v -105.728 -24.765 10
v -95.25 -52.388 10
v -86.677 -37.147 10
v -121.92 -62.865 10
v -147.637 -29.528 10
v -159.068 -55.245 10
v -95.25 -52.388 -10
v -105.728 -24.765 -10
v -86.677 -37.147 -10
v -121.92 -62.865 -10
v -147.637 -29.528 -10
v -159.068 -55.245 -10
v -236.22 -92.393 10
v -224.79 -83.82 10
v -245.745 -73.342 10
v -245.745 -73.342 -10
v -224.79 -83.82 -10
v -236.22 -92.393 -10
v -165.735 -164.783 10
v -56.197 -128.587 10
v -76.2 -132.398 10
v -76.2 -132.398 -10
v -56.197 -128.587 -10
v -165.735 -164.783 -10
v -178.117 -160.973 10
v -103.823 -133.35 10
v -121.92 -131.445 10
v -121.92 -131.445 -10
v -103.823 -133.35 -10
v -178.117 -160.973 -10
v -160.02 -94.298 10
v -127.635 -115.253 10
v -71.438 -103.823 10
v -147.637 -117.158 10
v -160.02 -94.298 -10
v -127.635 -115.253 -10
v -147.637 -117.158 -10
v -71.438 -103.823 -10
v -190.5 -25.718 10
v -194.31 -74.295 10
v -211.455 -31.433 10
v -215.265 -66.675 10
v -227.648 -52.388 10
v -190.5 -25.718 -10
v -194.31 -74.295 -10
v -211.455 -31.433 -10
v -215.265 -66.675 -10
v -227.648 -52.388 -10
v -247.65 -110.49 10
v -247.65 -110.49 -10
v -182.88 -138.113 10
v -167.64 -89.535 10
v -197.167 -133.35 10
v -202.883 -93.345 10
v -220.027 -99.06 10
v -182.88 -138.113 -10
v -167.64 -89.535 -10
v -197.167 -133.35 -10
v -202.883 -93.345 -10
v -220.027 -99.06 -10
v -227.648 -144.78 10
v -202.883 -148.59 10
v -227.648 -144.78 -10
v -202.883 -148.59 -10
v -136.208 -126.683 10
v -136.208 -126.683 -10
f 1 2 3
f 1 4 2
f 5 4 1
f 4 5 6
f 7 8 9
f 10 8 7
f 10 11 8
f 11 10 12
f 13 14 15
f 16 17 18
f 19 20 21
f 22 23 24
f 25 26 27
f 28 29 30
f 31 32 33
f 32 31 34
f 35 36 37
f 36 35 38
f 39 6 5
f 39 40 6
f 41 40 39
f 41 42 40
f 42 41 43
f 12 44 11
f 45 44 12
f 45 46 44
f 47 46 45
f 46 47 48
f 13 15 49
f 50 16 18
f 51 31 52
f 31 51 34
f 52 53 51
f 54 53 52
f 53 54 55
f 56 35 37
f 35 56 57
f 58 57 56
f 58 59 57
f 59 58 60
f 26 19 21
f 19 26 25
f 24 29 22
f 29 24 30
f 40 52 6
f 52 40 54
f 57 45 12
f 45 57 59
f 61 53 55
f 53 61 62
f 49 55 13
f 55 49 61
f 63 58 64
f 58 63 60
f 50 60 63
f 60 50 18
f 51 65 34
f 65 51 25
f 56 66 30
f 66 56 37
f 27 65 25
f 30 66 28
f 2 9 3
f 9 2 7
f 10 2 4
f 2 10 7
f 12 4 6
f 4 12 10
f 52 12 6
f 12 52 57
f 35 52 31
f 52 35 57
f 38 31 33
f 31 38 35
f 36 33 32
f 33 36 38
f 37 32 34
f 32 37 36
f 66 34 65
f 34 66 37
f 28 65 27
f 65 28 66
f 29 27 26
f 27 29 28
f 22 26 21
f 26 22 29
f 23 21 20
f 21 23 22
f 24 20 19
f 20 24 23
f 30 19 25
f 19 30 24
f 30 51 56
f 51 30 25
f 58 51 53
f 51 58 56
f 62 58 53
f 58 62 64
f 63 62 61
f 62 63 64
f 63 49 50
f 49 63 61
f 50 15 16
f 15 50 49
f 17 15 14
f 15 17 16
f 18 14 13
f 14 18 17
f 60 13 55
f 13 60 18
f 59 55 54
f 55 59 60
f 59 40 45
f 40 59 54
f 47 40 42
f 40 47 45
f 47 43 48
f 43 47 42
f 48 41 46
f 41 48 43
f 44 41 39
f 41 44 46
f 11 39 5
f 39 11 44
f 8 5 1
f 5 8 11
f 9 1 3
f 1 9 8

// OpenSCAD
polyhedron(
    points=[
    [-86.6775, -37.1475, 10],
    [-95.25, -52.3875, 10],
    [-121.92, -62.865, 10],
    [-159.0675, -55.245, 10],
    [-167.64, -89.535, 10],
    [-160.02, -94.2975, 10],
    [-71.4375, -103.8225, 10],
    [-127.635, -115.2525, 10],
    [-147.6375, -117.1575, 10],
    [-136.2075, -126.6825, 10],
    [-121.92, -131.445, 10],
    [-103.8225, -133.35, 10],
    [-76.2, -132.3975, 10],
    [-56.1975, -128.5875, 10],
    [-165.735, -164.7825, 10],
    [-178.1175, -160.9725, 10],
    [-182.88, -138.1125, 10],
    [-197.1675, -133.35, 10],
    [-202.8825, -148.59, 10],
    [-227.6475, -144.78, 10],
    [-247.65, -110.49, 10],
    [-245.745, -73.3425, 10],
    [-224.79, -83.82, 10],
    [-236.22, -92.3925, 10],
    [-220.0275, -99.06, 10],
    [-202.8825, -93.345, 10],
    [-194.31, -74.295, 10],
    [-215.265, -66.675, 10],
    [-227.6475, -52.3875, 10],
    [-211.455, -31.4325, 10],
    [-190.5, -25.7175, 10],
    [-147.6375, -29.5275, 10],
    [-105.7275, -24.765, 10],
    [-86.6775, -37.1475, -10],
    [-95.25, -52.3875, -10],
    [-121.92, -62.865, -10],
    [-159.0675, -55.245, -10],
    [-167.64, -89.535, -10],
    [-160.02, -94.2975, -10],
    [-71.4375, -103.8225, -10],
    [-127.635, -115.2525, -10],
    [-147.6375, -117.1575, -10],
    [-136.2075, -126.6825, -10],
    [-121.92, -131.445, -10],
    [-103.8225, -133.35, -10],
    [-76.2, -132.3975, -10],
    [-56.1975, -128.5875, -10],
    [-165.735, -164.7825, -10],
    [-178.1175, -160.9725, -10],
    [-182.88, -138.1125, -10],
    [-197.1675, -133.35, -10],
    [-202.8825, -148.59, -10],
    [-227.6475, -144.78, -10],
    [-247.65, -110.49, -10],
    [-245.745, -73.3425, -10],
    [-224.79, -83.82, -10],
    [-236.22, -92.3925, -10],
    [-220.0275, -99.06, -10],
    [-202.8825, -93.345, -10],
    [-194.31, -74.295, -10],
    [-215.265, -66.675, -10],
    [-227.6475, -52.3875, -10],
    [-211.455, -31.4325, -10],
    [-190.5, -25.7175, -10],
    [-147.6375, -29.5275, -10],
    [-105.7275, -24.765, -10],
    ],
    faces=[
        [31,32,0,1,2,3],
        [36,35,34,33,65,64],
        [21,22,23],
        [56,55,54],
        [12,13,14],
        [47,46,45],
        [10,11,15],
        [48,44,43],
        [5,6,7,8],
        [41,40,39,38],
        [26,27,28,29,30,31,3],
        [36,64,63,62,61,60,59],
        [20,21,23],
        [56,54,53],
        [16,17,24,25,4,5,8],
        [41,38,37,58,57,50,49],
        [11,12,14,15],
        [48,47,45,44],
        [25,26,3,4],
        [37,36,59,58],
        [17,18,19,20,23,24],
        [57,56,53,52,51,50],
        [8,9,15,16],
        [49,48,42,41],
        [15,9,10],
        [43,42,48],
        [0,33,34,1],
        [1,34,35,2],
        [2,35,36,3],
        [3,36,37,4],
        [4,37,38,5],
        [5,38,39,6],
        [6,39,40,7],
        [7,40,41,8],
        [8,41,42,9],
        [9,42,43,10],
        [10,43,44,11],
        [11,44,45,12],
        [12,45,46,13],
        [13,46,47,14],
        [14,47,48,15],
        [15,48,49,16],
        [16,49,50,17],
        [17,50,51,18],
        [18,51,52,19],
        [19,52,53,20],
        [20,53,54,21],
        [21,54,55,22],
        [22,55,56,23],
        [23,56,57,24],
        [24,57,58,25],
        [25,58,59,26],
        [26,59,60,27],
        [27,60,61,28],
        [28,61,62,29],
        [29,62,63,30],
        [30,63,64,31],
        [31,64,65,32],
        [32,65,33,0],
    ]
);
